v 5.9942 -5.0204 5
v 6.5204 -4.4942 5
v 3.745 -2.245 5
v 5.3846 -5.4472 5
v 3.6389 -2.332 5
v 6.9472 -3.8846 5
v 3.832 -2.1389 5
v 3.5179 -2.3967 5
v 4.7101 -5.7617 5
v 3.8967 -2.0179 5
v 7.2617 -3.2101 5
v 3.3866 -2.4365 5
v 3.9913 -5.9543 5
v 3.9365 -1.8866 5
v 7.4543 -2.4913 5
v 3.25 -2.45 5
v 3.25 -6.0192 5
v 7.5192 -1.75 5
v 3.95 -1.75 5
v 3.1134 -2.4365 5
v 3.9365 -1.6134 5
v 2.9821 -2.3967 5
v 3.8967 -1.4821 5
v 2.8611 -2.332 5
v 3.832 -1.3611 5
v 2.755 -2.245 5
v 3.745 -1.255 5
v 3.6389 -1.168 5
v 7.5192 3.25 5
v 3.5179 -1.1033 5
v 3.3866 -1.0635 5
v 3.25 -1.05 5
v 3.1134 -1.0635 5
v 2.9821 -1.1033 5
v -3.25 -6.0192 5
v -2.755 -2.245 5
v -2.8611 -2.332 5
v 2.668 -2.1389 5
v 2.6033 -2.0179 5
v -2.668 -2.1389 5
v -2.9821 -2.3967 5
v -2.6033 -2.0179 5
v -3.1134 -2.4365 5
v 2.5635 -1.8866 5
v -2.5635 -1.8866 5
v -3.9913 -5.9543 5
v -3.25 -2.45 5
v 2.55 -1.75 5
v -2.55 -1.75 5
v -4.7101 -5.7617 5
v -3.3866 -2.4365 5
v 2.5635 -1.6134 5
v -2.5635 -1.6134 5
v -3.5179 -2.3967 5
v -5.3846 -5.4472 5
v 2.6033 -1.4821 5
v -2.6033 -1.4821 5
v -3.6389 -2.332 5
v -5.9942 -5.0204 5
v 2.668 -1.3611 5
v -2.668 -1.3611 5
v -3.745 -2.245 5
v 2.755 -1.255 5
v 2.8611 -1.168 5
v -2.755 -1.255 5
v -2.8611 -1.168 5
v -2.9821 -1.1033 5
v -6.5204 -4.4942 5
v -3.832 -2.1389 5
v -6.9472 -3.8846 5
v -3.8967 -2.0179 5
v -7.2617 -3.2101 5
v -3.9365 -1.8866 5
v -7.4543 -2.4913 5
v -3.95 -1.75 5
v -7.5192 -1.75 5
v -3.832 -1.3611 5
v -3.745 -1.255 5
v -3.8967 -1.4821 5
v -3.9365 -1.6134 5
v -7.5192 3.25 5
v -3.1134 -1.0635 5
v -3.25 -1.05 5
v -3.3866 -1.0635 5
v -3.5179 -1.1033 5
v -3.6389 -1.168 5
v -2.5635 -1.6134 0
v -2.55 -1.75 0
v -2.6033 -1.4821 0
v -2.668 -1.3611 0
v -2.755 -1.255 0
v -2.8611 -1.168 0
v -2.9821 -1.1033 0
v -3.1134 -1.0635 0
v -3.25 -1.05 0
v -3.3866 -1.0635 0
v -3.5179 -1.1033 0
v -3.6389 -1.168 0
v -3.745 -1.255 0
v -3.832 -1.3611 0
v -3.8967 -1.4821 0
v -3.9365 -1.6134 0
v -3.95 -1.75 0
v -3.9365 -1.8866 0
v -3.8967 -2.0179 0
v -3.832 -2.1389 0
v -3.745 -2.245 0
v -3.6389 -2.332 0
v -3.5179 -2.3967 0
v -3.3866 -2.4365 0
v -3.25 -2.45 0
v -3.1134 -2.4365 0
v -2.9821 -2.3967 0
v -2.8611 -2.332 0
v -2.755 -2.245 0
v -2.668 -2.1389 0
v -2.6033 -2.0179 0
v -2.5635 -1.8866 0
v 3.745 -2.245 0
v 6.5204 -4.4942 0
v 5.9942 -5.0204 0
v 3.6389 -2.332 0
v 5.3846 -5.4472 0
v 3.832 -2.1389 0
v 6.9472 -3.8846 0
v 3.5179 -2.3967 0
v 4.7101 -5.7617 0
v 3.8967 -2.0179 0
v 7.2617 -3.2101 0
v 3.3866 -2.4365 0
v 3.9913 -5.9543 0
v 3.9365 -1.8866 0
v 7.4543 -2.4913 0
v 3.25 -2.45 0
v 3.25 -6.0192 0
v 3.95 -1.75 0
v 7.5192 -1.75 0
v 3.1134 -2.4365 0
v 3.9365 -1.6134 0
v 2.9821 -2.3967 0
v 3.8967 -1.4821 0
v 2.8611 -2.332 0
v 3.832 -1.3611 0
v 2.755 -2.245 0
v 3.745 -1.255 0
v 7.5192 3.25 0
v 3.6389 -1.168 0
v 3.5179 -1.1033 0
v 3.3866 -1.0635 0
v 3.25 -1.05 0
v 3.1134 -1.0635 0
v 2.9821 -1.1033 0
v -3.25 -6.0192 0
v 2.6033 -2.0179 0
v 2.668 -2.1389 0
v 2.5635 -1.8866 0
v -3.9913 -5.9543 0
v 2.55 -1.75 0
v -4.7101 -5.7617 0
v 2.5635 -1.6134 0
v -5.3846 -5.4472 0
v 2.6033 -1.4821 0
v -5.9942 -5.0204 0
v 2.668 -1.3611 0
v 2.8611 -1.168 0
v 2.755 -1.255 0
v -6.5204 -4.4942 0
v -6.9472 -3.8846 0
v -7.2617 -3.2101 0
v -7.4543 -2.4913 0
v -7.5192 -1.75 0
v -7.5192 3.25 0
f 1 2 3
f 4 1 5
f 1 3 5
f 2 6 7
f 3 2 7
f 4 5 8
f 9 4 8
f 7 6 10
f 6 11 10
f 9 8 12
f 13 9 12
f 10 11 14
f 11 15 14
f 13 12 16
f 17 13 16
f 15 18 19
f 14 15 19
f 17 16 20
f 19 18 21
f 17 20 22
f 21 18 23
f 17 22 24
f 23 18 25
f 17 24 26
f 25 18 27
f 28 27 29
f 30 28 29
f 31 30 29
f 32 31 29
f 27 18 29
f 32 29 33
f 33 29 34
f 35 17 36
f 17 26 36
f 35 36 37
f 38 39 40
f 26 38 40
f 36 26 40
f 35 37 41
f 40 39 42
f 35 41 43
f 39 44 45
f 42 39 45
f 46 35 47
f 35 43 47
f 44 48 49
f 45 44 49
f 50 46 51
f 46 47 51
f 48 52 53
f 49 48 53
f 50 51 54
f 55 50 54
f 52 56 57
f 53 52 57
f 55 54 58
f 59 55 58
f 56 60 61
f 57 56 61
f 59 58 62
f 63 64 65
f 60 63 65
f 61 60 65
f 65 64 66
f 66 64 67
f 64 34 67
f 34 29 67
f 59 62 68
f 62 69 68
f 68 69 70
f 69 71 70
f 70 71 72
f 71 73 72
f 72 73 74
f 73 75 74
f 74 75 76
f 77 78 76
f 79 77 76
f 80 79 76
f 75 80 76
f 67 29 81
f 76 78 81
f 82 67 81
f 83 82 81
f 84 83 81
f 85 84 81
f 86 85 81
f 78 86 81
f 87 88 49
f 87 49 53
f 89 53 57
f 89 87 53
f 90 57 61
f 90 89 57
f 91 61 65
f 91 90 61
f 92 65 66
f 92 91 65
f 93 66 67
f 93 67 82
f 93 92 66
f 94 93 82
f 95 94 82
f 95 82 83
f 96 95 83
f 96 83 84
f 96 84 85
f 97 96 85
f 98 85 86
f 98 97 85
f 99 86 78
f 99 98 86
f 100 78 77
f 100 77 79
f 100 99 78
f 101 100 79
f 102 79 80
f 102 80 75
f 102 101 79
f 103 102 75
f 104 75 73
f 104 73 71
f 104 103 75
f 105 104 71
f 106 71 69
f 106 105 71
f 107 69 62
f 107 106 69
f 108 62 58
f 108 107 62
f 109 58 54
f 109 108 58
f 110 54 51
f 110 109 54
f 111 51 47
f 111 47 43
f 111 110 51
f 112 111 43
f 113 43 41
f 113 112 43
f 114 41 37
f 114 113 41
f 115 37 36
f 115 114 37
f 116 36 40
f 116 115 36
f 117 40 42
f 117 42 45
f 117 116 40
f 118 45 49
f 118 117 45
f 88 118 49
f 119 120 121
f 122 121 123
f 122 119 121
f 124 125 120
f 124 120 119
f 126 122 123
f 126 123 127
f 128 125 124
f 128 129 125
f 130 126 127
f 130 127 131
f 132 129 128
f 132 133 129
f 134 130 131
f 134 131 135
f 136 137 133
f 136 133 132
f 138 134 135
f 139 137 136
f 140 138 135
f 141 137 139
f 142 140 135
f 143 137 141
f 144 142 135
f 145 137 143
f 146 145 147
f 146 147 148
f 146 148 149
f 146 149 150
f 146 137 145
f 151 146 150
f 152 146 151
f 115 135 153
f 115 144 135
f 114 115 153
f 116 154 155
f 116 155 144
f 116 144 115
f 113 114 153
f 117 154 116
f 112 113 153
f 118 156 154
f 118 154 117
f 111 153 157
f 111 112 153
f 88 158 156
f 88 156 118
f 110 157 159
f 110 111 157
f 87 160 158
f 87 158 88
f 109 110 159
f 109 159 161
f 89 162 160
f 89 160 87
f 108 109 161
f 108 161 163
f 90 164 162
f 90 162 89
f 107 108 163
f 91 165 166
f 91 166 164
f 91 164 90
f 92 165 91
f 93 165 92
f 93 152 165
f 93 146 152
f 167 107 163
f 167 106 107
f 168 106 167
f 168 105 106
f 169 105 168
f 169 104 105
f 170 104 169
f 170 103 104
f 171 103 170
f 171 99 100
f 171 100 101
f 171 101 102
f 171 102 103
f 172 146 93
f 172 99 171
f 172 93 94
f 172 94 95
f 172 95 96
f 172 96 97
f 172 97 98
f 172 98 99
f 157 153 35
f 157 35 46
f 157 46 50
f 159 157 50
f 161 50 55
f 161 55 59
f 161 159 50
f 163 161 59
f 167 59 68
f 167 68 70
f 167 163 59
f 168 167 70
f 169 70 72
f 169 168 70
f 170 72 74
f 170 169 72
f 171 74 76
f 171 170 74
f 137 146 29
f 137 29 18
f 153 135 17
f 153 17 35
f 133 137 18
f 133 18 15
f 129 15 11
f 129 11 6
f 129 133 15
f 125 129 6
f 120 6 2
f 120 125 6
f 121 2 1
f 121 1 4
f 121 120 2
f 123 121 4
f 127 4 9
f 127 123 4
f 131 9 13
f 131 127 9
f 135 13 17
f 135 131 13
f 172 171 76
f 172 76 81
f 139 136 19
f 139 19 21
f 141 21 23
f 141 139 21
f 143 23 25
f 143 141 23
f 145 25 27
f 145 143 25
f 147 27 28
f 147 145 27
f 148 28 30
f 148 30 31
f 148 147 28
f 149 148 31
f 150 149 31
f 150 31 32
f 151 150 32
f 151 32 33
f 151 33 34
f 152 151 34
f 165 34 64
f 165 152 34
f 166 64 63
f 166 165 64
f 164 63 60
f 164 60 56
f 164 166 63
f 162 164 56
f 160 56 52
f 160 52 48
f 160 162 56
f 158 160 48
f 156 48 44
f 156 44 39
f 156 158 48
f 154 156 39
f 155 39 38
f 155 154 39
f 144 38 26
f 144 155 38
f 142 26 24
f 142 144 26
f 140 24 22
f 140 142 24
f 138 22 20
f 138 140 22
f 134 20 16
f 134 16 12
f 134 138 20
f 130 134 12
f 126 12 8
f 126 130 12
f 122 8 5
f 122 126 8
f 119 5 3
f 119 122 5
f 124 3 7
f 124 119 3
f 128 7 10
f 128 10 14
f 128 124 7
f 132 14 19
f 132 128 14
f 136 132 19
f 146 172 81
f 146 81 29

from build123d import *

# Parameters (mm, degrees)
SKETCH1_R           = 0.7
BOSS_EXTRUDE2_DEPTH = 5


with BuildPart() as part:
    # Sketch1 → Boss-Extrude2 (new body)
    with BuildSketch(Plane.XY):
        with BuildLine():
            Line((3.25, -6.019172648), (-3.25, -6.019172648))
            ThreePointArc((-3.25, -6.019172648), (-6.268760929, -4.768760929), (-7.519172648, -1.75))
            Line((-7.519172648, -1.75), (-7.519172648, 3.25))
            Line((-7.519172648, 3.25), (7.519172648, 3.25))
            Line((7.519172648, 3.25), (7.519172648, -1.75))
            ThreePointArc((7.519172648, -1.75), (6.268760929, -4.768760929), (3.25, -6.019172648))
        make_face()
        with Locations((-3.25, -1.75)):
            Circle(SKETCH1_R, mode=Mode.SUBTRACT)
        with Locations((3.25, -1.75)):
            Circle(SKETCH1_R, mode=Mode.SUBTRACT)
    extrude(amount=BOSS_EXTRUDE2_DEPTH)


solid = part.part
